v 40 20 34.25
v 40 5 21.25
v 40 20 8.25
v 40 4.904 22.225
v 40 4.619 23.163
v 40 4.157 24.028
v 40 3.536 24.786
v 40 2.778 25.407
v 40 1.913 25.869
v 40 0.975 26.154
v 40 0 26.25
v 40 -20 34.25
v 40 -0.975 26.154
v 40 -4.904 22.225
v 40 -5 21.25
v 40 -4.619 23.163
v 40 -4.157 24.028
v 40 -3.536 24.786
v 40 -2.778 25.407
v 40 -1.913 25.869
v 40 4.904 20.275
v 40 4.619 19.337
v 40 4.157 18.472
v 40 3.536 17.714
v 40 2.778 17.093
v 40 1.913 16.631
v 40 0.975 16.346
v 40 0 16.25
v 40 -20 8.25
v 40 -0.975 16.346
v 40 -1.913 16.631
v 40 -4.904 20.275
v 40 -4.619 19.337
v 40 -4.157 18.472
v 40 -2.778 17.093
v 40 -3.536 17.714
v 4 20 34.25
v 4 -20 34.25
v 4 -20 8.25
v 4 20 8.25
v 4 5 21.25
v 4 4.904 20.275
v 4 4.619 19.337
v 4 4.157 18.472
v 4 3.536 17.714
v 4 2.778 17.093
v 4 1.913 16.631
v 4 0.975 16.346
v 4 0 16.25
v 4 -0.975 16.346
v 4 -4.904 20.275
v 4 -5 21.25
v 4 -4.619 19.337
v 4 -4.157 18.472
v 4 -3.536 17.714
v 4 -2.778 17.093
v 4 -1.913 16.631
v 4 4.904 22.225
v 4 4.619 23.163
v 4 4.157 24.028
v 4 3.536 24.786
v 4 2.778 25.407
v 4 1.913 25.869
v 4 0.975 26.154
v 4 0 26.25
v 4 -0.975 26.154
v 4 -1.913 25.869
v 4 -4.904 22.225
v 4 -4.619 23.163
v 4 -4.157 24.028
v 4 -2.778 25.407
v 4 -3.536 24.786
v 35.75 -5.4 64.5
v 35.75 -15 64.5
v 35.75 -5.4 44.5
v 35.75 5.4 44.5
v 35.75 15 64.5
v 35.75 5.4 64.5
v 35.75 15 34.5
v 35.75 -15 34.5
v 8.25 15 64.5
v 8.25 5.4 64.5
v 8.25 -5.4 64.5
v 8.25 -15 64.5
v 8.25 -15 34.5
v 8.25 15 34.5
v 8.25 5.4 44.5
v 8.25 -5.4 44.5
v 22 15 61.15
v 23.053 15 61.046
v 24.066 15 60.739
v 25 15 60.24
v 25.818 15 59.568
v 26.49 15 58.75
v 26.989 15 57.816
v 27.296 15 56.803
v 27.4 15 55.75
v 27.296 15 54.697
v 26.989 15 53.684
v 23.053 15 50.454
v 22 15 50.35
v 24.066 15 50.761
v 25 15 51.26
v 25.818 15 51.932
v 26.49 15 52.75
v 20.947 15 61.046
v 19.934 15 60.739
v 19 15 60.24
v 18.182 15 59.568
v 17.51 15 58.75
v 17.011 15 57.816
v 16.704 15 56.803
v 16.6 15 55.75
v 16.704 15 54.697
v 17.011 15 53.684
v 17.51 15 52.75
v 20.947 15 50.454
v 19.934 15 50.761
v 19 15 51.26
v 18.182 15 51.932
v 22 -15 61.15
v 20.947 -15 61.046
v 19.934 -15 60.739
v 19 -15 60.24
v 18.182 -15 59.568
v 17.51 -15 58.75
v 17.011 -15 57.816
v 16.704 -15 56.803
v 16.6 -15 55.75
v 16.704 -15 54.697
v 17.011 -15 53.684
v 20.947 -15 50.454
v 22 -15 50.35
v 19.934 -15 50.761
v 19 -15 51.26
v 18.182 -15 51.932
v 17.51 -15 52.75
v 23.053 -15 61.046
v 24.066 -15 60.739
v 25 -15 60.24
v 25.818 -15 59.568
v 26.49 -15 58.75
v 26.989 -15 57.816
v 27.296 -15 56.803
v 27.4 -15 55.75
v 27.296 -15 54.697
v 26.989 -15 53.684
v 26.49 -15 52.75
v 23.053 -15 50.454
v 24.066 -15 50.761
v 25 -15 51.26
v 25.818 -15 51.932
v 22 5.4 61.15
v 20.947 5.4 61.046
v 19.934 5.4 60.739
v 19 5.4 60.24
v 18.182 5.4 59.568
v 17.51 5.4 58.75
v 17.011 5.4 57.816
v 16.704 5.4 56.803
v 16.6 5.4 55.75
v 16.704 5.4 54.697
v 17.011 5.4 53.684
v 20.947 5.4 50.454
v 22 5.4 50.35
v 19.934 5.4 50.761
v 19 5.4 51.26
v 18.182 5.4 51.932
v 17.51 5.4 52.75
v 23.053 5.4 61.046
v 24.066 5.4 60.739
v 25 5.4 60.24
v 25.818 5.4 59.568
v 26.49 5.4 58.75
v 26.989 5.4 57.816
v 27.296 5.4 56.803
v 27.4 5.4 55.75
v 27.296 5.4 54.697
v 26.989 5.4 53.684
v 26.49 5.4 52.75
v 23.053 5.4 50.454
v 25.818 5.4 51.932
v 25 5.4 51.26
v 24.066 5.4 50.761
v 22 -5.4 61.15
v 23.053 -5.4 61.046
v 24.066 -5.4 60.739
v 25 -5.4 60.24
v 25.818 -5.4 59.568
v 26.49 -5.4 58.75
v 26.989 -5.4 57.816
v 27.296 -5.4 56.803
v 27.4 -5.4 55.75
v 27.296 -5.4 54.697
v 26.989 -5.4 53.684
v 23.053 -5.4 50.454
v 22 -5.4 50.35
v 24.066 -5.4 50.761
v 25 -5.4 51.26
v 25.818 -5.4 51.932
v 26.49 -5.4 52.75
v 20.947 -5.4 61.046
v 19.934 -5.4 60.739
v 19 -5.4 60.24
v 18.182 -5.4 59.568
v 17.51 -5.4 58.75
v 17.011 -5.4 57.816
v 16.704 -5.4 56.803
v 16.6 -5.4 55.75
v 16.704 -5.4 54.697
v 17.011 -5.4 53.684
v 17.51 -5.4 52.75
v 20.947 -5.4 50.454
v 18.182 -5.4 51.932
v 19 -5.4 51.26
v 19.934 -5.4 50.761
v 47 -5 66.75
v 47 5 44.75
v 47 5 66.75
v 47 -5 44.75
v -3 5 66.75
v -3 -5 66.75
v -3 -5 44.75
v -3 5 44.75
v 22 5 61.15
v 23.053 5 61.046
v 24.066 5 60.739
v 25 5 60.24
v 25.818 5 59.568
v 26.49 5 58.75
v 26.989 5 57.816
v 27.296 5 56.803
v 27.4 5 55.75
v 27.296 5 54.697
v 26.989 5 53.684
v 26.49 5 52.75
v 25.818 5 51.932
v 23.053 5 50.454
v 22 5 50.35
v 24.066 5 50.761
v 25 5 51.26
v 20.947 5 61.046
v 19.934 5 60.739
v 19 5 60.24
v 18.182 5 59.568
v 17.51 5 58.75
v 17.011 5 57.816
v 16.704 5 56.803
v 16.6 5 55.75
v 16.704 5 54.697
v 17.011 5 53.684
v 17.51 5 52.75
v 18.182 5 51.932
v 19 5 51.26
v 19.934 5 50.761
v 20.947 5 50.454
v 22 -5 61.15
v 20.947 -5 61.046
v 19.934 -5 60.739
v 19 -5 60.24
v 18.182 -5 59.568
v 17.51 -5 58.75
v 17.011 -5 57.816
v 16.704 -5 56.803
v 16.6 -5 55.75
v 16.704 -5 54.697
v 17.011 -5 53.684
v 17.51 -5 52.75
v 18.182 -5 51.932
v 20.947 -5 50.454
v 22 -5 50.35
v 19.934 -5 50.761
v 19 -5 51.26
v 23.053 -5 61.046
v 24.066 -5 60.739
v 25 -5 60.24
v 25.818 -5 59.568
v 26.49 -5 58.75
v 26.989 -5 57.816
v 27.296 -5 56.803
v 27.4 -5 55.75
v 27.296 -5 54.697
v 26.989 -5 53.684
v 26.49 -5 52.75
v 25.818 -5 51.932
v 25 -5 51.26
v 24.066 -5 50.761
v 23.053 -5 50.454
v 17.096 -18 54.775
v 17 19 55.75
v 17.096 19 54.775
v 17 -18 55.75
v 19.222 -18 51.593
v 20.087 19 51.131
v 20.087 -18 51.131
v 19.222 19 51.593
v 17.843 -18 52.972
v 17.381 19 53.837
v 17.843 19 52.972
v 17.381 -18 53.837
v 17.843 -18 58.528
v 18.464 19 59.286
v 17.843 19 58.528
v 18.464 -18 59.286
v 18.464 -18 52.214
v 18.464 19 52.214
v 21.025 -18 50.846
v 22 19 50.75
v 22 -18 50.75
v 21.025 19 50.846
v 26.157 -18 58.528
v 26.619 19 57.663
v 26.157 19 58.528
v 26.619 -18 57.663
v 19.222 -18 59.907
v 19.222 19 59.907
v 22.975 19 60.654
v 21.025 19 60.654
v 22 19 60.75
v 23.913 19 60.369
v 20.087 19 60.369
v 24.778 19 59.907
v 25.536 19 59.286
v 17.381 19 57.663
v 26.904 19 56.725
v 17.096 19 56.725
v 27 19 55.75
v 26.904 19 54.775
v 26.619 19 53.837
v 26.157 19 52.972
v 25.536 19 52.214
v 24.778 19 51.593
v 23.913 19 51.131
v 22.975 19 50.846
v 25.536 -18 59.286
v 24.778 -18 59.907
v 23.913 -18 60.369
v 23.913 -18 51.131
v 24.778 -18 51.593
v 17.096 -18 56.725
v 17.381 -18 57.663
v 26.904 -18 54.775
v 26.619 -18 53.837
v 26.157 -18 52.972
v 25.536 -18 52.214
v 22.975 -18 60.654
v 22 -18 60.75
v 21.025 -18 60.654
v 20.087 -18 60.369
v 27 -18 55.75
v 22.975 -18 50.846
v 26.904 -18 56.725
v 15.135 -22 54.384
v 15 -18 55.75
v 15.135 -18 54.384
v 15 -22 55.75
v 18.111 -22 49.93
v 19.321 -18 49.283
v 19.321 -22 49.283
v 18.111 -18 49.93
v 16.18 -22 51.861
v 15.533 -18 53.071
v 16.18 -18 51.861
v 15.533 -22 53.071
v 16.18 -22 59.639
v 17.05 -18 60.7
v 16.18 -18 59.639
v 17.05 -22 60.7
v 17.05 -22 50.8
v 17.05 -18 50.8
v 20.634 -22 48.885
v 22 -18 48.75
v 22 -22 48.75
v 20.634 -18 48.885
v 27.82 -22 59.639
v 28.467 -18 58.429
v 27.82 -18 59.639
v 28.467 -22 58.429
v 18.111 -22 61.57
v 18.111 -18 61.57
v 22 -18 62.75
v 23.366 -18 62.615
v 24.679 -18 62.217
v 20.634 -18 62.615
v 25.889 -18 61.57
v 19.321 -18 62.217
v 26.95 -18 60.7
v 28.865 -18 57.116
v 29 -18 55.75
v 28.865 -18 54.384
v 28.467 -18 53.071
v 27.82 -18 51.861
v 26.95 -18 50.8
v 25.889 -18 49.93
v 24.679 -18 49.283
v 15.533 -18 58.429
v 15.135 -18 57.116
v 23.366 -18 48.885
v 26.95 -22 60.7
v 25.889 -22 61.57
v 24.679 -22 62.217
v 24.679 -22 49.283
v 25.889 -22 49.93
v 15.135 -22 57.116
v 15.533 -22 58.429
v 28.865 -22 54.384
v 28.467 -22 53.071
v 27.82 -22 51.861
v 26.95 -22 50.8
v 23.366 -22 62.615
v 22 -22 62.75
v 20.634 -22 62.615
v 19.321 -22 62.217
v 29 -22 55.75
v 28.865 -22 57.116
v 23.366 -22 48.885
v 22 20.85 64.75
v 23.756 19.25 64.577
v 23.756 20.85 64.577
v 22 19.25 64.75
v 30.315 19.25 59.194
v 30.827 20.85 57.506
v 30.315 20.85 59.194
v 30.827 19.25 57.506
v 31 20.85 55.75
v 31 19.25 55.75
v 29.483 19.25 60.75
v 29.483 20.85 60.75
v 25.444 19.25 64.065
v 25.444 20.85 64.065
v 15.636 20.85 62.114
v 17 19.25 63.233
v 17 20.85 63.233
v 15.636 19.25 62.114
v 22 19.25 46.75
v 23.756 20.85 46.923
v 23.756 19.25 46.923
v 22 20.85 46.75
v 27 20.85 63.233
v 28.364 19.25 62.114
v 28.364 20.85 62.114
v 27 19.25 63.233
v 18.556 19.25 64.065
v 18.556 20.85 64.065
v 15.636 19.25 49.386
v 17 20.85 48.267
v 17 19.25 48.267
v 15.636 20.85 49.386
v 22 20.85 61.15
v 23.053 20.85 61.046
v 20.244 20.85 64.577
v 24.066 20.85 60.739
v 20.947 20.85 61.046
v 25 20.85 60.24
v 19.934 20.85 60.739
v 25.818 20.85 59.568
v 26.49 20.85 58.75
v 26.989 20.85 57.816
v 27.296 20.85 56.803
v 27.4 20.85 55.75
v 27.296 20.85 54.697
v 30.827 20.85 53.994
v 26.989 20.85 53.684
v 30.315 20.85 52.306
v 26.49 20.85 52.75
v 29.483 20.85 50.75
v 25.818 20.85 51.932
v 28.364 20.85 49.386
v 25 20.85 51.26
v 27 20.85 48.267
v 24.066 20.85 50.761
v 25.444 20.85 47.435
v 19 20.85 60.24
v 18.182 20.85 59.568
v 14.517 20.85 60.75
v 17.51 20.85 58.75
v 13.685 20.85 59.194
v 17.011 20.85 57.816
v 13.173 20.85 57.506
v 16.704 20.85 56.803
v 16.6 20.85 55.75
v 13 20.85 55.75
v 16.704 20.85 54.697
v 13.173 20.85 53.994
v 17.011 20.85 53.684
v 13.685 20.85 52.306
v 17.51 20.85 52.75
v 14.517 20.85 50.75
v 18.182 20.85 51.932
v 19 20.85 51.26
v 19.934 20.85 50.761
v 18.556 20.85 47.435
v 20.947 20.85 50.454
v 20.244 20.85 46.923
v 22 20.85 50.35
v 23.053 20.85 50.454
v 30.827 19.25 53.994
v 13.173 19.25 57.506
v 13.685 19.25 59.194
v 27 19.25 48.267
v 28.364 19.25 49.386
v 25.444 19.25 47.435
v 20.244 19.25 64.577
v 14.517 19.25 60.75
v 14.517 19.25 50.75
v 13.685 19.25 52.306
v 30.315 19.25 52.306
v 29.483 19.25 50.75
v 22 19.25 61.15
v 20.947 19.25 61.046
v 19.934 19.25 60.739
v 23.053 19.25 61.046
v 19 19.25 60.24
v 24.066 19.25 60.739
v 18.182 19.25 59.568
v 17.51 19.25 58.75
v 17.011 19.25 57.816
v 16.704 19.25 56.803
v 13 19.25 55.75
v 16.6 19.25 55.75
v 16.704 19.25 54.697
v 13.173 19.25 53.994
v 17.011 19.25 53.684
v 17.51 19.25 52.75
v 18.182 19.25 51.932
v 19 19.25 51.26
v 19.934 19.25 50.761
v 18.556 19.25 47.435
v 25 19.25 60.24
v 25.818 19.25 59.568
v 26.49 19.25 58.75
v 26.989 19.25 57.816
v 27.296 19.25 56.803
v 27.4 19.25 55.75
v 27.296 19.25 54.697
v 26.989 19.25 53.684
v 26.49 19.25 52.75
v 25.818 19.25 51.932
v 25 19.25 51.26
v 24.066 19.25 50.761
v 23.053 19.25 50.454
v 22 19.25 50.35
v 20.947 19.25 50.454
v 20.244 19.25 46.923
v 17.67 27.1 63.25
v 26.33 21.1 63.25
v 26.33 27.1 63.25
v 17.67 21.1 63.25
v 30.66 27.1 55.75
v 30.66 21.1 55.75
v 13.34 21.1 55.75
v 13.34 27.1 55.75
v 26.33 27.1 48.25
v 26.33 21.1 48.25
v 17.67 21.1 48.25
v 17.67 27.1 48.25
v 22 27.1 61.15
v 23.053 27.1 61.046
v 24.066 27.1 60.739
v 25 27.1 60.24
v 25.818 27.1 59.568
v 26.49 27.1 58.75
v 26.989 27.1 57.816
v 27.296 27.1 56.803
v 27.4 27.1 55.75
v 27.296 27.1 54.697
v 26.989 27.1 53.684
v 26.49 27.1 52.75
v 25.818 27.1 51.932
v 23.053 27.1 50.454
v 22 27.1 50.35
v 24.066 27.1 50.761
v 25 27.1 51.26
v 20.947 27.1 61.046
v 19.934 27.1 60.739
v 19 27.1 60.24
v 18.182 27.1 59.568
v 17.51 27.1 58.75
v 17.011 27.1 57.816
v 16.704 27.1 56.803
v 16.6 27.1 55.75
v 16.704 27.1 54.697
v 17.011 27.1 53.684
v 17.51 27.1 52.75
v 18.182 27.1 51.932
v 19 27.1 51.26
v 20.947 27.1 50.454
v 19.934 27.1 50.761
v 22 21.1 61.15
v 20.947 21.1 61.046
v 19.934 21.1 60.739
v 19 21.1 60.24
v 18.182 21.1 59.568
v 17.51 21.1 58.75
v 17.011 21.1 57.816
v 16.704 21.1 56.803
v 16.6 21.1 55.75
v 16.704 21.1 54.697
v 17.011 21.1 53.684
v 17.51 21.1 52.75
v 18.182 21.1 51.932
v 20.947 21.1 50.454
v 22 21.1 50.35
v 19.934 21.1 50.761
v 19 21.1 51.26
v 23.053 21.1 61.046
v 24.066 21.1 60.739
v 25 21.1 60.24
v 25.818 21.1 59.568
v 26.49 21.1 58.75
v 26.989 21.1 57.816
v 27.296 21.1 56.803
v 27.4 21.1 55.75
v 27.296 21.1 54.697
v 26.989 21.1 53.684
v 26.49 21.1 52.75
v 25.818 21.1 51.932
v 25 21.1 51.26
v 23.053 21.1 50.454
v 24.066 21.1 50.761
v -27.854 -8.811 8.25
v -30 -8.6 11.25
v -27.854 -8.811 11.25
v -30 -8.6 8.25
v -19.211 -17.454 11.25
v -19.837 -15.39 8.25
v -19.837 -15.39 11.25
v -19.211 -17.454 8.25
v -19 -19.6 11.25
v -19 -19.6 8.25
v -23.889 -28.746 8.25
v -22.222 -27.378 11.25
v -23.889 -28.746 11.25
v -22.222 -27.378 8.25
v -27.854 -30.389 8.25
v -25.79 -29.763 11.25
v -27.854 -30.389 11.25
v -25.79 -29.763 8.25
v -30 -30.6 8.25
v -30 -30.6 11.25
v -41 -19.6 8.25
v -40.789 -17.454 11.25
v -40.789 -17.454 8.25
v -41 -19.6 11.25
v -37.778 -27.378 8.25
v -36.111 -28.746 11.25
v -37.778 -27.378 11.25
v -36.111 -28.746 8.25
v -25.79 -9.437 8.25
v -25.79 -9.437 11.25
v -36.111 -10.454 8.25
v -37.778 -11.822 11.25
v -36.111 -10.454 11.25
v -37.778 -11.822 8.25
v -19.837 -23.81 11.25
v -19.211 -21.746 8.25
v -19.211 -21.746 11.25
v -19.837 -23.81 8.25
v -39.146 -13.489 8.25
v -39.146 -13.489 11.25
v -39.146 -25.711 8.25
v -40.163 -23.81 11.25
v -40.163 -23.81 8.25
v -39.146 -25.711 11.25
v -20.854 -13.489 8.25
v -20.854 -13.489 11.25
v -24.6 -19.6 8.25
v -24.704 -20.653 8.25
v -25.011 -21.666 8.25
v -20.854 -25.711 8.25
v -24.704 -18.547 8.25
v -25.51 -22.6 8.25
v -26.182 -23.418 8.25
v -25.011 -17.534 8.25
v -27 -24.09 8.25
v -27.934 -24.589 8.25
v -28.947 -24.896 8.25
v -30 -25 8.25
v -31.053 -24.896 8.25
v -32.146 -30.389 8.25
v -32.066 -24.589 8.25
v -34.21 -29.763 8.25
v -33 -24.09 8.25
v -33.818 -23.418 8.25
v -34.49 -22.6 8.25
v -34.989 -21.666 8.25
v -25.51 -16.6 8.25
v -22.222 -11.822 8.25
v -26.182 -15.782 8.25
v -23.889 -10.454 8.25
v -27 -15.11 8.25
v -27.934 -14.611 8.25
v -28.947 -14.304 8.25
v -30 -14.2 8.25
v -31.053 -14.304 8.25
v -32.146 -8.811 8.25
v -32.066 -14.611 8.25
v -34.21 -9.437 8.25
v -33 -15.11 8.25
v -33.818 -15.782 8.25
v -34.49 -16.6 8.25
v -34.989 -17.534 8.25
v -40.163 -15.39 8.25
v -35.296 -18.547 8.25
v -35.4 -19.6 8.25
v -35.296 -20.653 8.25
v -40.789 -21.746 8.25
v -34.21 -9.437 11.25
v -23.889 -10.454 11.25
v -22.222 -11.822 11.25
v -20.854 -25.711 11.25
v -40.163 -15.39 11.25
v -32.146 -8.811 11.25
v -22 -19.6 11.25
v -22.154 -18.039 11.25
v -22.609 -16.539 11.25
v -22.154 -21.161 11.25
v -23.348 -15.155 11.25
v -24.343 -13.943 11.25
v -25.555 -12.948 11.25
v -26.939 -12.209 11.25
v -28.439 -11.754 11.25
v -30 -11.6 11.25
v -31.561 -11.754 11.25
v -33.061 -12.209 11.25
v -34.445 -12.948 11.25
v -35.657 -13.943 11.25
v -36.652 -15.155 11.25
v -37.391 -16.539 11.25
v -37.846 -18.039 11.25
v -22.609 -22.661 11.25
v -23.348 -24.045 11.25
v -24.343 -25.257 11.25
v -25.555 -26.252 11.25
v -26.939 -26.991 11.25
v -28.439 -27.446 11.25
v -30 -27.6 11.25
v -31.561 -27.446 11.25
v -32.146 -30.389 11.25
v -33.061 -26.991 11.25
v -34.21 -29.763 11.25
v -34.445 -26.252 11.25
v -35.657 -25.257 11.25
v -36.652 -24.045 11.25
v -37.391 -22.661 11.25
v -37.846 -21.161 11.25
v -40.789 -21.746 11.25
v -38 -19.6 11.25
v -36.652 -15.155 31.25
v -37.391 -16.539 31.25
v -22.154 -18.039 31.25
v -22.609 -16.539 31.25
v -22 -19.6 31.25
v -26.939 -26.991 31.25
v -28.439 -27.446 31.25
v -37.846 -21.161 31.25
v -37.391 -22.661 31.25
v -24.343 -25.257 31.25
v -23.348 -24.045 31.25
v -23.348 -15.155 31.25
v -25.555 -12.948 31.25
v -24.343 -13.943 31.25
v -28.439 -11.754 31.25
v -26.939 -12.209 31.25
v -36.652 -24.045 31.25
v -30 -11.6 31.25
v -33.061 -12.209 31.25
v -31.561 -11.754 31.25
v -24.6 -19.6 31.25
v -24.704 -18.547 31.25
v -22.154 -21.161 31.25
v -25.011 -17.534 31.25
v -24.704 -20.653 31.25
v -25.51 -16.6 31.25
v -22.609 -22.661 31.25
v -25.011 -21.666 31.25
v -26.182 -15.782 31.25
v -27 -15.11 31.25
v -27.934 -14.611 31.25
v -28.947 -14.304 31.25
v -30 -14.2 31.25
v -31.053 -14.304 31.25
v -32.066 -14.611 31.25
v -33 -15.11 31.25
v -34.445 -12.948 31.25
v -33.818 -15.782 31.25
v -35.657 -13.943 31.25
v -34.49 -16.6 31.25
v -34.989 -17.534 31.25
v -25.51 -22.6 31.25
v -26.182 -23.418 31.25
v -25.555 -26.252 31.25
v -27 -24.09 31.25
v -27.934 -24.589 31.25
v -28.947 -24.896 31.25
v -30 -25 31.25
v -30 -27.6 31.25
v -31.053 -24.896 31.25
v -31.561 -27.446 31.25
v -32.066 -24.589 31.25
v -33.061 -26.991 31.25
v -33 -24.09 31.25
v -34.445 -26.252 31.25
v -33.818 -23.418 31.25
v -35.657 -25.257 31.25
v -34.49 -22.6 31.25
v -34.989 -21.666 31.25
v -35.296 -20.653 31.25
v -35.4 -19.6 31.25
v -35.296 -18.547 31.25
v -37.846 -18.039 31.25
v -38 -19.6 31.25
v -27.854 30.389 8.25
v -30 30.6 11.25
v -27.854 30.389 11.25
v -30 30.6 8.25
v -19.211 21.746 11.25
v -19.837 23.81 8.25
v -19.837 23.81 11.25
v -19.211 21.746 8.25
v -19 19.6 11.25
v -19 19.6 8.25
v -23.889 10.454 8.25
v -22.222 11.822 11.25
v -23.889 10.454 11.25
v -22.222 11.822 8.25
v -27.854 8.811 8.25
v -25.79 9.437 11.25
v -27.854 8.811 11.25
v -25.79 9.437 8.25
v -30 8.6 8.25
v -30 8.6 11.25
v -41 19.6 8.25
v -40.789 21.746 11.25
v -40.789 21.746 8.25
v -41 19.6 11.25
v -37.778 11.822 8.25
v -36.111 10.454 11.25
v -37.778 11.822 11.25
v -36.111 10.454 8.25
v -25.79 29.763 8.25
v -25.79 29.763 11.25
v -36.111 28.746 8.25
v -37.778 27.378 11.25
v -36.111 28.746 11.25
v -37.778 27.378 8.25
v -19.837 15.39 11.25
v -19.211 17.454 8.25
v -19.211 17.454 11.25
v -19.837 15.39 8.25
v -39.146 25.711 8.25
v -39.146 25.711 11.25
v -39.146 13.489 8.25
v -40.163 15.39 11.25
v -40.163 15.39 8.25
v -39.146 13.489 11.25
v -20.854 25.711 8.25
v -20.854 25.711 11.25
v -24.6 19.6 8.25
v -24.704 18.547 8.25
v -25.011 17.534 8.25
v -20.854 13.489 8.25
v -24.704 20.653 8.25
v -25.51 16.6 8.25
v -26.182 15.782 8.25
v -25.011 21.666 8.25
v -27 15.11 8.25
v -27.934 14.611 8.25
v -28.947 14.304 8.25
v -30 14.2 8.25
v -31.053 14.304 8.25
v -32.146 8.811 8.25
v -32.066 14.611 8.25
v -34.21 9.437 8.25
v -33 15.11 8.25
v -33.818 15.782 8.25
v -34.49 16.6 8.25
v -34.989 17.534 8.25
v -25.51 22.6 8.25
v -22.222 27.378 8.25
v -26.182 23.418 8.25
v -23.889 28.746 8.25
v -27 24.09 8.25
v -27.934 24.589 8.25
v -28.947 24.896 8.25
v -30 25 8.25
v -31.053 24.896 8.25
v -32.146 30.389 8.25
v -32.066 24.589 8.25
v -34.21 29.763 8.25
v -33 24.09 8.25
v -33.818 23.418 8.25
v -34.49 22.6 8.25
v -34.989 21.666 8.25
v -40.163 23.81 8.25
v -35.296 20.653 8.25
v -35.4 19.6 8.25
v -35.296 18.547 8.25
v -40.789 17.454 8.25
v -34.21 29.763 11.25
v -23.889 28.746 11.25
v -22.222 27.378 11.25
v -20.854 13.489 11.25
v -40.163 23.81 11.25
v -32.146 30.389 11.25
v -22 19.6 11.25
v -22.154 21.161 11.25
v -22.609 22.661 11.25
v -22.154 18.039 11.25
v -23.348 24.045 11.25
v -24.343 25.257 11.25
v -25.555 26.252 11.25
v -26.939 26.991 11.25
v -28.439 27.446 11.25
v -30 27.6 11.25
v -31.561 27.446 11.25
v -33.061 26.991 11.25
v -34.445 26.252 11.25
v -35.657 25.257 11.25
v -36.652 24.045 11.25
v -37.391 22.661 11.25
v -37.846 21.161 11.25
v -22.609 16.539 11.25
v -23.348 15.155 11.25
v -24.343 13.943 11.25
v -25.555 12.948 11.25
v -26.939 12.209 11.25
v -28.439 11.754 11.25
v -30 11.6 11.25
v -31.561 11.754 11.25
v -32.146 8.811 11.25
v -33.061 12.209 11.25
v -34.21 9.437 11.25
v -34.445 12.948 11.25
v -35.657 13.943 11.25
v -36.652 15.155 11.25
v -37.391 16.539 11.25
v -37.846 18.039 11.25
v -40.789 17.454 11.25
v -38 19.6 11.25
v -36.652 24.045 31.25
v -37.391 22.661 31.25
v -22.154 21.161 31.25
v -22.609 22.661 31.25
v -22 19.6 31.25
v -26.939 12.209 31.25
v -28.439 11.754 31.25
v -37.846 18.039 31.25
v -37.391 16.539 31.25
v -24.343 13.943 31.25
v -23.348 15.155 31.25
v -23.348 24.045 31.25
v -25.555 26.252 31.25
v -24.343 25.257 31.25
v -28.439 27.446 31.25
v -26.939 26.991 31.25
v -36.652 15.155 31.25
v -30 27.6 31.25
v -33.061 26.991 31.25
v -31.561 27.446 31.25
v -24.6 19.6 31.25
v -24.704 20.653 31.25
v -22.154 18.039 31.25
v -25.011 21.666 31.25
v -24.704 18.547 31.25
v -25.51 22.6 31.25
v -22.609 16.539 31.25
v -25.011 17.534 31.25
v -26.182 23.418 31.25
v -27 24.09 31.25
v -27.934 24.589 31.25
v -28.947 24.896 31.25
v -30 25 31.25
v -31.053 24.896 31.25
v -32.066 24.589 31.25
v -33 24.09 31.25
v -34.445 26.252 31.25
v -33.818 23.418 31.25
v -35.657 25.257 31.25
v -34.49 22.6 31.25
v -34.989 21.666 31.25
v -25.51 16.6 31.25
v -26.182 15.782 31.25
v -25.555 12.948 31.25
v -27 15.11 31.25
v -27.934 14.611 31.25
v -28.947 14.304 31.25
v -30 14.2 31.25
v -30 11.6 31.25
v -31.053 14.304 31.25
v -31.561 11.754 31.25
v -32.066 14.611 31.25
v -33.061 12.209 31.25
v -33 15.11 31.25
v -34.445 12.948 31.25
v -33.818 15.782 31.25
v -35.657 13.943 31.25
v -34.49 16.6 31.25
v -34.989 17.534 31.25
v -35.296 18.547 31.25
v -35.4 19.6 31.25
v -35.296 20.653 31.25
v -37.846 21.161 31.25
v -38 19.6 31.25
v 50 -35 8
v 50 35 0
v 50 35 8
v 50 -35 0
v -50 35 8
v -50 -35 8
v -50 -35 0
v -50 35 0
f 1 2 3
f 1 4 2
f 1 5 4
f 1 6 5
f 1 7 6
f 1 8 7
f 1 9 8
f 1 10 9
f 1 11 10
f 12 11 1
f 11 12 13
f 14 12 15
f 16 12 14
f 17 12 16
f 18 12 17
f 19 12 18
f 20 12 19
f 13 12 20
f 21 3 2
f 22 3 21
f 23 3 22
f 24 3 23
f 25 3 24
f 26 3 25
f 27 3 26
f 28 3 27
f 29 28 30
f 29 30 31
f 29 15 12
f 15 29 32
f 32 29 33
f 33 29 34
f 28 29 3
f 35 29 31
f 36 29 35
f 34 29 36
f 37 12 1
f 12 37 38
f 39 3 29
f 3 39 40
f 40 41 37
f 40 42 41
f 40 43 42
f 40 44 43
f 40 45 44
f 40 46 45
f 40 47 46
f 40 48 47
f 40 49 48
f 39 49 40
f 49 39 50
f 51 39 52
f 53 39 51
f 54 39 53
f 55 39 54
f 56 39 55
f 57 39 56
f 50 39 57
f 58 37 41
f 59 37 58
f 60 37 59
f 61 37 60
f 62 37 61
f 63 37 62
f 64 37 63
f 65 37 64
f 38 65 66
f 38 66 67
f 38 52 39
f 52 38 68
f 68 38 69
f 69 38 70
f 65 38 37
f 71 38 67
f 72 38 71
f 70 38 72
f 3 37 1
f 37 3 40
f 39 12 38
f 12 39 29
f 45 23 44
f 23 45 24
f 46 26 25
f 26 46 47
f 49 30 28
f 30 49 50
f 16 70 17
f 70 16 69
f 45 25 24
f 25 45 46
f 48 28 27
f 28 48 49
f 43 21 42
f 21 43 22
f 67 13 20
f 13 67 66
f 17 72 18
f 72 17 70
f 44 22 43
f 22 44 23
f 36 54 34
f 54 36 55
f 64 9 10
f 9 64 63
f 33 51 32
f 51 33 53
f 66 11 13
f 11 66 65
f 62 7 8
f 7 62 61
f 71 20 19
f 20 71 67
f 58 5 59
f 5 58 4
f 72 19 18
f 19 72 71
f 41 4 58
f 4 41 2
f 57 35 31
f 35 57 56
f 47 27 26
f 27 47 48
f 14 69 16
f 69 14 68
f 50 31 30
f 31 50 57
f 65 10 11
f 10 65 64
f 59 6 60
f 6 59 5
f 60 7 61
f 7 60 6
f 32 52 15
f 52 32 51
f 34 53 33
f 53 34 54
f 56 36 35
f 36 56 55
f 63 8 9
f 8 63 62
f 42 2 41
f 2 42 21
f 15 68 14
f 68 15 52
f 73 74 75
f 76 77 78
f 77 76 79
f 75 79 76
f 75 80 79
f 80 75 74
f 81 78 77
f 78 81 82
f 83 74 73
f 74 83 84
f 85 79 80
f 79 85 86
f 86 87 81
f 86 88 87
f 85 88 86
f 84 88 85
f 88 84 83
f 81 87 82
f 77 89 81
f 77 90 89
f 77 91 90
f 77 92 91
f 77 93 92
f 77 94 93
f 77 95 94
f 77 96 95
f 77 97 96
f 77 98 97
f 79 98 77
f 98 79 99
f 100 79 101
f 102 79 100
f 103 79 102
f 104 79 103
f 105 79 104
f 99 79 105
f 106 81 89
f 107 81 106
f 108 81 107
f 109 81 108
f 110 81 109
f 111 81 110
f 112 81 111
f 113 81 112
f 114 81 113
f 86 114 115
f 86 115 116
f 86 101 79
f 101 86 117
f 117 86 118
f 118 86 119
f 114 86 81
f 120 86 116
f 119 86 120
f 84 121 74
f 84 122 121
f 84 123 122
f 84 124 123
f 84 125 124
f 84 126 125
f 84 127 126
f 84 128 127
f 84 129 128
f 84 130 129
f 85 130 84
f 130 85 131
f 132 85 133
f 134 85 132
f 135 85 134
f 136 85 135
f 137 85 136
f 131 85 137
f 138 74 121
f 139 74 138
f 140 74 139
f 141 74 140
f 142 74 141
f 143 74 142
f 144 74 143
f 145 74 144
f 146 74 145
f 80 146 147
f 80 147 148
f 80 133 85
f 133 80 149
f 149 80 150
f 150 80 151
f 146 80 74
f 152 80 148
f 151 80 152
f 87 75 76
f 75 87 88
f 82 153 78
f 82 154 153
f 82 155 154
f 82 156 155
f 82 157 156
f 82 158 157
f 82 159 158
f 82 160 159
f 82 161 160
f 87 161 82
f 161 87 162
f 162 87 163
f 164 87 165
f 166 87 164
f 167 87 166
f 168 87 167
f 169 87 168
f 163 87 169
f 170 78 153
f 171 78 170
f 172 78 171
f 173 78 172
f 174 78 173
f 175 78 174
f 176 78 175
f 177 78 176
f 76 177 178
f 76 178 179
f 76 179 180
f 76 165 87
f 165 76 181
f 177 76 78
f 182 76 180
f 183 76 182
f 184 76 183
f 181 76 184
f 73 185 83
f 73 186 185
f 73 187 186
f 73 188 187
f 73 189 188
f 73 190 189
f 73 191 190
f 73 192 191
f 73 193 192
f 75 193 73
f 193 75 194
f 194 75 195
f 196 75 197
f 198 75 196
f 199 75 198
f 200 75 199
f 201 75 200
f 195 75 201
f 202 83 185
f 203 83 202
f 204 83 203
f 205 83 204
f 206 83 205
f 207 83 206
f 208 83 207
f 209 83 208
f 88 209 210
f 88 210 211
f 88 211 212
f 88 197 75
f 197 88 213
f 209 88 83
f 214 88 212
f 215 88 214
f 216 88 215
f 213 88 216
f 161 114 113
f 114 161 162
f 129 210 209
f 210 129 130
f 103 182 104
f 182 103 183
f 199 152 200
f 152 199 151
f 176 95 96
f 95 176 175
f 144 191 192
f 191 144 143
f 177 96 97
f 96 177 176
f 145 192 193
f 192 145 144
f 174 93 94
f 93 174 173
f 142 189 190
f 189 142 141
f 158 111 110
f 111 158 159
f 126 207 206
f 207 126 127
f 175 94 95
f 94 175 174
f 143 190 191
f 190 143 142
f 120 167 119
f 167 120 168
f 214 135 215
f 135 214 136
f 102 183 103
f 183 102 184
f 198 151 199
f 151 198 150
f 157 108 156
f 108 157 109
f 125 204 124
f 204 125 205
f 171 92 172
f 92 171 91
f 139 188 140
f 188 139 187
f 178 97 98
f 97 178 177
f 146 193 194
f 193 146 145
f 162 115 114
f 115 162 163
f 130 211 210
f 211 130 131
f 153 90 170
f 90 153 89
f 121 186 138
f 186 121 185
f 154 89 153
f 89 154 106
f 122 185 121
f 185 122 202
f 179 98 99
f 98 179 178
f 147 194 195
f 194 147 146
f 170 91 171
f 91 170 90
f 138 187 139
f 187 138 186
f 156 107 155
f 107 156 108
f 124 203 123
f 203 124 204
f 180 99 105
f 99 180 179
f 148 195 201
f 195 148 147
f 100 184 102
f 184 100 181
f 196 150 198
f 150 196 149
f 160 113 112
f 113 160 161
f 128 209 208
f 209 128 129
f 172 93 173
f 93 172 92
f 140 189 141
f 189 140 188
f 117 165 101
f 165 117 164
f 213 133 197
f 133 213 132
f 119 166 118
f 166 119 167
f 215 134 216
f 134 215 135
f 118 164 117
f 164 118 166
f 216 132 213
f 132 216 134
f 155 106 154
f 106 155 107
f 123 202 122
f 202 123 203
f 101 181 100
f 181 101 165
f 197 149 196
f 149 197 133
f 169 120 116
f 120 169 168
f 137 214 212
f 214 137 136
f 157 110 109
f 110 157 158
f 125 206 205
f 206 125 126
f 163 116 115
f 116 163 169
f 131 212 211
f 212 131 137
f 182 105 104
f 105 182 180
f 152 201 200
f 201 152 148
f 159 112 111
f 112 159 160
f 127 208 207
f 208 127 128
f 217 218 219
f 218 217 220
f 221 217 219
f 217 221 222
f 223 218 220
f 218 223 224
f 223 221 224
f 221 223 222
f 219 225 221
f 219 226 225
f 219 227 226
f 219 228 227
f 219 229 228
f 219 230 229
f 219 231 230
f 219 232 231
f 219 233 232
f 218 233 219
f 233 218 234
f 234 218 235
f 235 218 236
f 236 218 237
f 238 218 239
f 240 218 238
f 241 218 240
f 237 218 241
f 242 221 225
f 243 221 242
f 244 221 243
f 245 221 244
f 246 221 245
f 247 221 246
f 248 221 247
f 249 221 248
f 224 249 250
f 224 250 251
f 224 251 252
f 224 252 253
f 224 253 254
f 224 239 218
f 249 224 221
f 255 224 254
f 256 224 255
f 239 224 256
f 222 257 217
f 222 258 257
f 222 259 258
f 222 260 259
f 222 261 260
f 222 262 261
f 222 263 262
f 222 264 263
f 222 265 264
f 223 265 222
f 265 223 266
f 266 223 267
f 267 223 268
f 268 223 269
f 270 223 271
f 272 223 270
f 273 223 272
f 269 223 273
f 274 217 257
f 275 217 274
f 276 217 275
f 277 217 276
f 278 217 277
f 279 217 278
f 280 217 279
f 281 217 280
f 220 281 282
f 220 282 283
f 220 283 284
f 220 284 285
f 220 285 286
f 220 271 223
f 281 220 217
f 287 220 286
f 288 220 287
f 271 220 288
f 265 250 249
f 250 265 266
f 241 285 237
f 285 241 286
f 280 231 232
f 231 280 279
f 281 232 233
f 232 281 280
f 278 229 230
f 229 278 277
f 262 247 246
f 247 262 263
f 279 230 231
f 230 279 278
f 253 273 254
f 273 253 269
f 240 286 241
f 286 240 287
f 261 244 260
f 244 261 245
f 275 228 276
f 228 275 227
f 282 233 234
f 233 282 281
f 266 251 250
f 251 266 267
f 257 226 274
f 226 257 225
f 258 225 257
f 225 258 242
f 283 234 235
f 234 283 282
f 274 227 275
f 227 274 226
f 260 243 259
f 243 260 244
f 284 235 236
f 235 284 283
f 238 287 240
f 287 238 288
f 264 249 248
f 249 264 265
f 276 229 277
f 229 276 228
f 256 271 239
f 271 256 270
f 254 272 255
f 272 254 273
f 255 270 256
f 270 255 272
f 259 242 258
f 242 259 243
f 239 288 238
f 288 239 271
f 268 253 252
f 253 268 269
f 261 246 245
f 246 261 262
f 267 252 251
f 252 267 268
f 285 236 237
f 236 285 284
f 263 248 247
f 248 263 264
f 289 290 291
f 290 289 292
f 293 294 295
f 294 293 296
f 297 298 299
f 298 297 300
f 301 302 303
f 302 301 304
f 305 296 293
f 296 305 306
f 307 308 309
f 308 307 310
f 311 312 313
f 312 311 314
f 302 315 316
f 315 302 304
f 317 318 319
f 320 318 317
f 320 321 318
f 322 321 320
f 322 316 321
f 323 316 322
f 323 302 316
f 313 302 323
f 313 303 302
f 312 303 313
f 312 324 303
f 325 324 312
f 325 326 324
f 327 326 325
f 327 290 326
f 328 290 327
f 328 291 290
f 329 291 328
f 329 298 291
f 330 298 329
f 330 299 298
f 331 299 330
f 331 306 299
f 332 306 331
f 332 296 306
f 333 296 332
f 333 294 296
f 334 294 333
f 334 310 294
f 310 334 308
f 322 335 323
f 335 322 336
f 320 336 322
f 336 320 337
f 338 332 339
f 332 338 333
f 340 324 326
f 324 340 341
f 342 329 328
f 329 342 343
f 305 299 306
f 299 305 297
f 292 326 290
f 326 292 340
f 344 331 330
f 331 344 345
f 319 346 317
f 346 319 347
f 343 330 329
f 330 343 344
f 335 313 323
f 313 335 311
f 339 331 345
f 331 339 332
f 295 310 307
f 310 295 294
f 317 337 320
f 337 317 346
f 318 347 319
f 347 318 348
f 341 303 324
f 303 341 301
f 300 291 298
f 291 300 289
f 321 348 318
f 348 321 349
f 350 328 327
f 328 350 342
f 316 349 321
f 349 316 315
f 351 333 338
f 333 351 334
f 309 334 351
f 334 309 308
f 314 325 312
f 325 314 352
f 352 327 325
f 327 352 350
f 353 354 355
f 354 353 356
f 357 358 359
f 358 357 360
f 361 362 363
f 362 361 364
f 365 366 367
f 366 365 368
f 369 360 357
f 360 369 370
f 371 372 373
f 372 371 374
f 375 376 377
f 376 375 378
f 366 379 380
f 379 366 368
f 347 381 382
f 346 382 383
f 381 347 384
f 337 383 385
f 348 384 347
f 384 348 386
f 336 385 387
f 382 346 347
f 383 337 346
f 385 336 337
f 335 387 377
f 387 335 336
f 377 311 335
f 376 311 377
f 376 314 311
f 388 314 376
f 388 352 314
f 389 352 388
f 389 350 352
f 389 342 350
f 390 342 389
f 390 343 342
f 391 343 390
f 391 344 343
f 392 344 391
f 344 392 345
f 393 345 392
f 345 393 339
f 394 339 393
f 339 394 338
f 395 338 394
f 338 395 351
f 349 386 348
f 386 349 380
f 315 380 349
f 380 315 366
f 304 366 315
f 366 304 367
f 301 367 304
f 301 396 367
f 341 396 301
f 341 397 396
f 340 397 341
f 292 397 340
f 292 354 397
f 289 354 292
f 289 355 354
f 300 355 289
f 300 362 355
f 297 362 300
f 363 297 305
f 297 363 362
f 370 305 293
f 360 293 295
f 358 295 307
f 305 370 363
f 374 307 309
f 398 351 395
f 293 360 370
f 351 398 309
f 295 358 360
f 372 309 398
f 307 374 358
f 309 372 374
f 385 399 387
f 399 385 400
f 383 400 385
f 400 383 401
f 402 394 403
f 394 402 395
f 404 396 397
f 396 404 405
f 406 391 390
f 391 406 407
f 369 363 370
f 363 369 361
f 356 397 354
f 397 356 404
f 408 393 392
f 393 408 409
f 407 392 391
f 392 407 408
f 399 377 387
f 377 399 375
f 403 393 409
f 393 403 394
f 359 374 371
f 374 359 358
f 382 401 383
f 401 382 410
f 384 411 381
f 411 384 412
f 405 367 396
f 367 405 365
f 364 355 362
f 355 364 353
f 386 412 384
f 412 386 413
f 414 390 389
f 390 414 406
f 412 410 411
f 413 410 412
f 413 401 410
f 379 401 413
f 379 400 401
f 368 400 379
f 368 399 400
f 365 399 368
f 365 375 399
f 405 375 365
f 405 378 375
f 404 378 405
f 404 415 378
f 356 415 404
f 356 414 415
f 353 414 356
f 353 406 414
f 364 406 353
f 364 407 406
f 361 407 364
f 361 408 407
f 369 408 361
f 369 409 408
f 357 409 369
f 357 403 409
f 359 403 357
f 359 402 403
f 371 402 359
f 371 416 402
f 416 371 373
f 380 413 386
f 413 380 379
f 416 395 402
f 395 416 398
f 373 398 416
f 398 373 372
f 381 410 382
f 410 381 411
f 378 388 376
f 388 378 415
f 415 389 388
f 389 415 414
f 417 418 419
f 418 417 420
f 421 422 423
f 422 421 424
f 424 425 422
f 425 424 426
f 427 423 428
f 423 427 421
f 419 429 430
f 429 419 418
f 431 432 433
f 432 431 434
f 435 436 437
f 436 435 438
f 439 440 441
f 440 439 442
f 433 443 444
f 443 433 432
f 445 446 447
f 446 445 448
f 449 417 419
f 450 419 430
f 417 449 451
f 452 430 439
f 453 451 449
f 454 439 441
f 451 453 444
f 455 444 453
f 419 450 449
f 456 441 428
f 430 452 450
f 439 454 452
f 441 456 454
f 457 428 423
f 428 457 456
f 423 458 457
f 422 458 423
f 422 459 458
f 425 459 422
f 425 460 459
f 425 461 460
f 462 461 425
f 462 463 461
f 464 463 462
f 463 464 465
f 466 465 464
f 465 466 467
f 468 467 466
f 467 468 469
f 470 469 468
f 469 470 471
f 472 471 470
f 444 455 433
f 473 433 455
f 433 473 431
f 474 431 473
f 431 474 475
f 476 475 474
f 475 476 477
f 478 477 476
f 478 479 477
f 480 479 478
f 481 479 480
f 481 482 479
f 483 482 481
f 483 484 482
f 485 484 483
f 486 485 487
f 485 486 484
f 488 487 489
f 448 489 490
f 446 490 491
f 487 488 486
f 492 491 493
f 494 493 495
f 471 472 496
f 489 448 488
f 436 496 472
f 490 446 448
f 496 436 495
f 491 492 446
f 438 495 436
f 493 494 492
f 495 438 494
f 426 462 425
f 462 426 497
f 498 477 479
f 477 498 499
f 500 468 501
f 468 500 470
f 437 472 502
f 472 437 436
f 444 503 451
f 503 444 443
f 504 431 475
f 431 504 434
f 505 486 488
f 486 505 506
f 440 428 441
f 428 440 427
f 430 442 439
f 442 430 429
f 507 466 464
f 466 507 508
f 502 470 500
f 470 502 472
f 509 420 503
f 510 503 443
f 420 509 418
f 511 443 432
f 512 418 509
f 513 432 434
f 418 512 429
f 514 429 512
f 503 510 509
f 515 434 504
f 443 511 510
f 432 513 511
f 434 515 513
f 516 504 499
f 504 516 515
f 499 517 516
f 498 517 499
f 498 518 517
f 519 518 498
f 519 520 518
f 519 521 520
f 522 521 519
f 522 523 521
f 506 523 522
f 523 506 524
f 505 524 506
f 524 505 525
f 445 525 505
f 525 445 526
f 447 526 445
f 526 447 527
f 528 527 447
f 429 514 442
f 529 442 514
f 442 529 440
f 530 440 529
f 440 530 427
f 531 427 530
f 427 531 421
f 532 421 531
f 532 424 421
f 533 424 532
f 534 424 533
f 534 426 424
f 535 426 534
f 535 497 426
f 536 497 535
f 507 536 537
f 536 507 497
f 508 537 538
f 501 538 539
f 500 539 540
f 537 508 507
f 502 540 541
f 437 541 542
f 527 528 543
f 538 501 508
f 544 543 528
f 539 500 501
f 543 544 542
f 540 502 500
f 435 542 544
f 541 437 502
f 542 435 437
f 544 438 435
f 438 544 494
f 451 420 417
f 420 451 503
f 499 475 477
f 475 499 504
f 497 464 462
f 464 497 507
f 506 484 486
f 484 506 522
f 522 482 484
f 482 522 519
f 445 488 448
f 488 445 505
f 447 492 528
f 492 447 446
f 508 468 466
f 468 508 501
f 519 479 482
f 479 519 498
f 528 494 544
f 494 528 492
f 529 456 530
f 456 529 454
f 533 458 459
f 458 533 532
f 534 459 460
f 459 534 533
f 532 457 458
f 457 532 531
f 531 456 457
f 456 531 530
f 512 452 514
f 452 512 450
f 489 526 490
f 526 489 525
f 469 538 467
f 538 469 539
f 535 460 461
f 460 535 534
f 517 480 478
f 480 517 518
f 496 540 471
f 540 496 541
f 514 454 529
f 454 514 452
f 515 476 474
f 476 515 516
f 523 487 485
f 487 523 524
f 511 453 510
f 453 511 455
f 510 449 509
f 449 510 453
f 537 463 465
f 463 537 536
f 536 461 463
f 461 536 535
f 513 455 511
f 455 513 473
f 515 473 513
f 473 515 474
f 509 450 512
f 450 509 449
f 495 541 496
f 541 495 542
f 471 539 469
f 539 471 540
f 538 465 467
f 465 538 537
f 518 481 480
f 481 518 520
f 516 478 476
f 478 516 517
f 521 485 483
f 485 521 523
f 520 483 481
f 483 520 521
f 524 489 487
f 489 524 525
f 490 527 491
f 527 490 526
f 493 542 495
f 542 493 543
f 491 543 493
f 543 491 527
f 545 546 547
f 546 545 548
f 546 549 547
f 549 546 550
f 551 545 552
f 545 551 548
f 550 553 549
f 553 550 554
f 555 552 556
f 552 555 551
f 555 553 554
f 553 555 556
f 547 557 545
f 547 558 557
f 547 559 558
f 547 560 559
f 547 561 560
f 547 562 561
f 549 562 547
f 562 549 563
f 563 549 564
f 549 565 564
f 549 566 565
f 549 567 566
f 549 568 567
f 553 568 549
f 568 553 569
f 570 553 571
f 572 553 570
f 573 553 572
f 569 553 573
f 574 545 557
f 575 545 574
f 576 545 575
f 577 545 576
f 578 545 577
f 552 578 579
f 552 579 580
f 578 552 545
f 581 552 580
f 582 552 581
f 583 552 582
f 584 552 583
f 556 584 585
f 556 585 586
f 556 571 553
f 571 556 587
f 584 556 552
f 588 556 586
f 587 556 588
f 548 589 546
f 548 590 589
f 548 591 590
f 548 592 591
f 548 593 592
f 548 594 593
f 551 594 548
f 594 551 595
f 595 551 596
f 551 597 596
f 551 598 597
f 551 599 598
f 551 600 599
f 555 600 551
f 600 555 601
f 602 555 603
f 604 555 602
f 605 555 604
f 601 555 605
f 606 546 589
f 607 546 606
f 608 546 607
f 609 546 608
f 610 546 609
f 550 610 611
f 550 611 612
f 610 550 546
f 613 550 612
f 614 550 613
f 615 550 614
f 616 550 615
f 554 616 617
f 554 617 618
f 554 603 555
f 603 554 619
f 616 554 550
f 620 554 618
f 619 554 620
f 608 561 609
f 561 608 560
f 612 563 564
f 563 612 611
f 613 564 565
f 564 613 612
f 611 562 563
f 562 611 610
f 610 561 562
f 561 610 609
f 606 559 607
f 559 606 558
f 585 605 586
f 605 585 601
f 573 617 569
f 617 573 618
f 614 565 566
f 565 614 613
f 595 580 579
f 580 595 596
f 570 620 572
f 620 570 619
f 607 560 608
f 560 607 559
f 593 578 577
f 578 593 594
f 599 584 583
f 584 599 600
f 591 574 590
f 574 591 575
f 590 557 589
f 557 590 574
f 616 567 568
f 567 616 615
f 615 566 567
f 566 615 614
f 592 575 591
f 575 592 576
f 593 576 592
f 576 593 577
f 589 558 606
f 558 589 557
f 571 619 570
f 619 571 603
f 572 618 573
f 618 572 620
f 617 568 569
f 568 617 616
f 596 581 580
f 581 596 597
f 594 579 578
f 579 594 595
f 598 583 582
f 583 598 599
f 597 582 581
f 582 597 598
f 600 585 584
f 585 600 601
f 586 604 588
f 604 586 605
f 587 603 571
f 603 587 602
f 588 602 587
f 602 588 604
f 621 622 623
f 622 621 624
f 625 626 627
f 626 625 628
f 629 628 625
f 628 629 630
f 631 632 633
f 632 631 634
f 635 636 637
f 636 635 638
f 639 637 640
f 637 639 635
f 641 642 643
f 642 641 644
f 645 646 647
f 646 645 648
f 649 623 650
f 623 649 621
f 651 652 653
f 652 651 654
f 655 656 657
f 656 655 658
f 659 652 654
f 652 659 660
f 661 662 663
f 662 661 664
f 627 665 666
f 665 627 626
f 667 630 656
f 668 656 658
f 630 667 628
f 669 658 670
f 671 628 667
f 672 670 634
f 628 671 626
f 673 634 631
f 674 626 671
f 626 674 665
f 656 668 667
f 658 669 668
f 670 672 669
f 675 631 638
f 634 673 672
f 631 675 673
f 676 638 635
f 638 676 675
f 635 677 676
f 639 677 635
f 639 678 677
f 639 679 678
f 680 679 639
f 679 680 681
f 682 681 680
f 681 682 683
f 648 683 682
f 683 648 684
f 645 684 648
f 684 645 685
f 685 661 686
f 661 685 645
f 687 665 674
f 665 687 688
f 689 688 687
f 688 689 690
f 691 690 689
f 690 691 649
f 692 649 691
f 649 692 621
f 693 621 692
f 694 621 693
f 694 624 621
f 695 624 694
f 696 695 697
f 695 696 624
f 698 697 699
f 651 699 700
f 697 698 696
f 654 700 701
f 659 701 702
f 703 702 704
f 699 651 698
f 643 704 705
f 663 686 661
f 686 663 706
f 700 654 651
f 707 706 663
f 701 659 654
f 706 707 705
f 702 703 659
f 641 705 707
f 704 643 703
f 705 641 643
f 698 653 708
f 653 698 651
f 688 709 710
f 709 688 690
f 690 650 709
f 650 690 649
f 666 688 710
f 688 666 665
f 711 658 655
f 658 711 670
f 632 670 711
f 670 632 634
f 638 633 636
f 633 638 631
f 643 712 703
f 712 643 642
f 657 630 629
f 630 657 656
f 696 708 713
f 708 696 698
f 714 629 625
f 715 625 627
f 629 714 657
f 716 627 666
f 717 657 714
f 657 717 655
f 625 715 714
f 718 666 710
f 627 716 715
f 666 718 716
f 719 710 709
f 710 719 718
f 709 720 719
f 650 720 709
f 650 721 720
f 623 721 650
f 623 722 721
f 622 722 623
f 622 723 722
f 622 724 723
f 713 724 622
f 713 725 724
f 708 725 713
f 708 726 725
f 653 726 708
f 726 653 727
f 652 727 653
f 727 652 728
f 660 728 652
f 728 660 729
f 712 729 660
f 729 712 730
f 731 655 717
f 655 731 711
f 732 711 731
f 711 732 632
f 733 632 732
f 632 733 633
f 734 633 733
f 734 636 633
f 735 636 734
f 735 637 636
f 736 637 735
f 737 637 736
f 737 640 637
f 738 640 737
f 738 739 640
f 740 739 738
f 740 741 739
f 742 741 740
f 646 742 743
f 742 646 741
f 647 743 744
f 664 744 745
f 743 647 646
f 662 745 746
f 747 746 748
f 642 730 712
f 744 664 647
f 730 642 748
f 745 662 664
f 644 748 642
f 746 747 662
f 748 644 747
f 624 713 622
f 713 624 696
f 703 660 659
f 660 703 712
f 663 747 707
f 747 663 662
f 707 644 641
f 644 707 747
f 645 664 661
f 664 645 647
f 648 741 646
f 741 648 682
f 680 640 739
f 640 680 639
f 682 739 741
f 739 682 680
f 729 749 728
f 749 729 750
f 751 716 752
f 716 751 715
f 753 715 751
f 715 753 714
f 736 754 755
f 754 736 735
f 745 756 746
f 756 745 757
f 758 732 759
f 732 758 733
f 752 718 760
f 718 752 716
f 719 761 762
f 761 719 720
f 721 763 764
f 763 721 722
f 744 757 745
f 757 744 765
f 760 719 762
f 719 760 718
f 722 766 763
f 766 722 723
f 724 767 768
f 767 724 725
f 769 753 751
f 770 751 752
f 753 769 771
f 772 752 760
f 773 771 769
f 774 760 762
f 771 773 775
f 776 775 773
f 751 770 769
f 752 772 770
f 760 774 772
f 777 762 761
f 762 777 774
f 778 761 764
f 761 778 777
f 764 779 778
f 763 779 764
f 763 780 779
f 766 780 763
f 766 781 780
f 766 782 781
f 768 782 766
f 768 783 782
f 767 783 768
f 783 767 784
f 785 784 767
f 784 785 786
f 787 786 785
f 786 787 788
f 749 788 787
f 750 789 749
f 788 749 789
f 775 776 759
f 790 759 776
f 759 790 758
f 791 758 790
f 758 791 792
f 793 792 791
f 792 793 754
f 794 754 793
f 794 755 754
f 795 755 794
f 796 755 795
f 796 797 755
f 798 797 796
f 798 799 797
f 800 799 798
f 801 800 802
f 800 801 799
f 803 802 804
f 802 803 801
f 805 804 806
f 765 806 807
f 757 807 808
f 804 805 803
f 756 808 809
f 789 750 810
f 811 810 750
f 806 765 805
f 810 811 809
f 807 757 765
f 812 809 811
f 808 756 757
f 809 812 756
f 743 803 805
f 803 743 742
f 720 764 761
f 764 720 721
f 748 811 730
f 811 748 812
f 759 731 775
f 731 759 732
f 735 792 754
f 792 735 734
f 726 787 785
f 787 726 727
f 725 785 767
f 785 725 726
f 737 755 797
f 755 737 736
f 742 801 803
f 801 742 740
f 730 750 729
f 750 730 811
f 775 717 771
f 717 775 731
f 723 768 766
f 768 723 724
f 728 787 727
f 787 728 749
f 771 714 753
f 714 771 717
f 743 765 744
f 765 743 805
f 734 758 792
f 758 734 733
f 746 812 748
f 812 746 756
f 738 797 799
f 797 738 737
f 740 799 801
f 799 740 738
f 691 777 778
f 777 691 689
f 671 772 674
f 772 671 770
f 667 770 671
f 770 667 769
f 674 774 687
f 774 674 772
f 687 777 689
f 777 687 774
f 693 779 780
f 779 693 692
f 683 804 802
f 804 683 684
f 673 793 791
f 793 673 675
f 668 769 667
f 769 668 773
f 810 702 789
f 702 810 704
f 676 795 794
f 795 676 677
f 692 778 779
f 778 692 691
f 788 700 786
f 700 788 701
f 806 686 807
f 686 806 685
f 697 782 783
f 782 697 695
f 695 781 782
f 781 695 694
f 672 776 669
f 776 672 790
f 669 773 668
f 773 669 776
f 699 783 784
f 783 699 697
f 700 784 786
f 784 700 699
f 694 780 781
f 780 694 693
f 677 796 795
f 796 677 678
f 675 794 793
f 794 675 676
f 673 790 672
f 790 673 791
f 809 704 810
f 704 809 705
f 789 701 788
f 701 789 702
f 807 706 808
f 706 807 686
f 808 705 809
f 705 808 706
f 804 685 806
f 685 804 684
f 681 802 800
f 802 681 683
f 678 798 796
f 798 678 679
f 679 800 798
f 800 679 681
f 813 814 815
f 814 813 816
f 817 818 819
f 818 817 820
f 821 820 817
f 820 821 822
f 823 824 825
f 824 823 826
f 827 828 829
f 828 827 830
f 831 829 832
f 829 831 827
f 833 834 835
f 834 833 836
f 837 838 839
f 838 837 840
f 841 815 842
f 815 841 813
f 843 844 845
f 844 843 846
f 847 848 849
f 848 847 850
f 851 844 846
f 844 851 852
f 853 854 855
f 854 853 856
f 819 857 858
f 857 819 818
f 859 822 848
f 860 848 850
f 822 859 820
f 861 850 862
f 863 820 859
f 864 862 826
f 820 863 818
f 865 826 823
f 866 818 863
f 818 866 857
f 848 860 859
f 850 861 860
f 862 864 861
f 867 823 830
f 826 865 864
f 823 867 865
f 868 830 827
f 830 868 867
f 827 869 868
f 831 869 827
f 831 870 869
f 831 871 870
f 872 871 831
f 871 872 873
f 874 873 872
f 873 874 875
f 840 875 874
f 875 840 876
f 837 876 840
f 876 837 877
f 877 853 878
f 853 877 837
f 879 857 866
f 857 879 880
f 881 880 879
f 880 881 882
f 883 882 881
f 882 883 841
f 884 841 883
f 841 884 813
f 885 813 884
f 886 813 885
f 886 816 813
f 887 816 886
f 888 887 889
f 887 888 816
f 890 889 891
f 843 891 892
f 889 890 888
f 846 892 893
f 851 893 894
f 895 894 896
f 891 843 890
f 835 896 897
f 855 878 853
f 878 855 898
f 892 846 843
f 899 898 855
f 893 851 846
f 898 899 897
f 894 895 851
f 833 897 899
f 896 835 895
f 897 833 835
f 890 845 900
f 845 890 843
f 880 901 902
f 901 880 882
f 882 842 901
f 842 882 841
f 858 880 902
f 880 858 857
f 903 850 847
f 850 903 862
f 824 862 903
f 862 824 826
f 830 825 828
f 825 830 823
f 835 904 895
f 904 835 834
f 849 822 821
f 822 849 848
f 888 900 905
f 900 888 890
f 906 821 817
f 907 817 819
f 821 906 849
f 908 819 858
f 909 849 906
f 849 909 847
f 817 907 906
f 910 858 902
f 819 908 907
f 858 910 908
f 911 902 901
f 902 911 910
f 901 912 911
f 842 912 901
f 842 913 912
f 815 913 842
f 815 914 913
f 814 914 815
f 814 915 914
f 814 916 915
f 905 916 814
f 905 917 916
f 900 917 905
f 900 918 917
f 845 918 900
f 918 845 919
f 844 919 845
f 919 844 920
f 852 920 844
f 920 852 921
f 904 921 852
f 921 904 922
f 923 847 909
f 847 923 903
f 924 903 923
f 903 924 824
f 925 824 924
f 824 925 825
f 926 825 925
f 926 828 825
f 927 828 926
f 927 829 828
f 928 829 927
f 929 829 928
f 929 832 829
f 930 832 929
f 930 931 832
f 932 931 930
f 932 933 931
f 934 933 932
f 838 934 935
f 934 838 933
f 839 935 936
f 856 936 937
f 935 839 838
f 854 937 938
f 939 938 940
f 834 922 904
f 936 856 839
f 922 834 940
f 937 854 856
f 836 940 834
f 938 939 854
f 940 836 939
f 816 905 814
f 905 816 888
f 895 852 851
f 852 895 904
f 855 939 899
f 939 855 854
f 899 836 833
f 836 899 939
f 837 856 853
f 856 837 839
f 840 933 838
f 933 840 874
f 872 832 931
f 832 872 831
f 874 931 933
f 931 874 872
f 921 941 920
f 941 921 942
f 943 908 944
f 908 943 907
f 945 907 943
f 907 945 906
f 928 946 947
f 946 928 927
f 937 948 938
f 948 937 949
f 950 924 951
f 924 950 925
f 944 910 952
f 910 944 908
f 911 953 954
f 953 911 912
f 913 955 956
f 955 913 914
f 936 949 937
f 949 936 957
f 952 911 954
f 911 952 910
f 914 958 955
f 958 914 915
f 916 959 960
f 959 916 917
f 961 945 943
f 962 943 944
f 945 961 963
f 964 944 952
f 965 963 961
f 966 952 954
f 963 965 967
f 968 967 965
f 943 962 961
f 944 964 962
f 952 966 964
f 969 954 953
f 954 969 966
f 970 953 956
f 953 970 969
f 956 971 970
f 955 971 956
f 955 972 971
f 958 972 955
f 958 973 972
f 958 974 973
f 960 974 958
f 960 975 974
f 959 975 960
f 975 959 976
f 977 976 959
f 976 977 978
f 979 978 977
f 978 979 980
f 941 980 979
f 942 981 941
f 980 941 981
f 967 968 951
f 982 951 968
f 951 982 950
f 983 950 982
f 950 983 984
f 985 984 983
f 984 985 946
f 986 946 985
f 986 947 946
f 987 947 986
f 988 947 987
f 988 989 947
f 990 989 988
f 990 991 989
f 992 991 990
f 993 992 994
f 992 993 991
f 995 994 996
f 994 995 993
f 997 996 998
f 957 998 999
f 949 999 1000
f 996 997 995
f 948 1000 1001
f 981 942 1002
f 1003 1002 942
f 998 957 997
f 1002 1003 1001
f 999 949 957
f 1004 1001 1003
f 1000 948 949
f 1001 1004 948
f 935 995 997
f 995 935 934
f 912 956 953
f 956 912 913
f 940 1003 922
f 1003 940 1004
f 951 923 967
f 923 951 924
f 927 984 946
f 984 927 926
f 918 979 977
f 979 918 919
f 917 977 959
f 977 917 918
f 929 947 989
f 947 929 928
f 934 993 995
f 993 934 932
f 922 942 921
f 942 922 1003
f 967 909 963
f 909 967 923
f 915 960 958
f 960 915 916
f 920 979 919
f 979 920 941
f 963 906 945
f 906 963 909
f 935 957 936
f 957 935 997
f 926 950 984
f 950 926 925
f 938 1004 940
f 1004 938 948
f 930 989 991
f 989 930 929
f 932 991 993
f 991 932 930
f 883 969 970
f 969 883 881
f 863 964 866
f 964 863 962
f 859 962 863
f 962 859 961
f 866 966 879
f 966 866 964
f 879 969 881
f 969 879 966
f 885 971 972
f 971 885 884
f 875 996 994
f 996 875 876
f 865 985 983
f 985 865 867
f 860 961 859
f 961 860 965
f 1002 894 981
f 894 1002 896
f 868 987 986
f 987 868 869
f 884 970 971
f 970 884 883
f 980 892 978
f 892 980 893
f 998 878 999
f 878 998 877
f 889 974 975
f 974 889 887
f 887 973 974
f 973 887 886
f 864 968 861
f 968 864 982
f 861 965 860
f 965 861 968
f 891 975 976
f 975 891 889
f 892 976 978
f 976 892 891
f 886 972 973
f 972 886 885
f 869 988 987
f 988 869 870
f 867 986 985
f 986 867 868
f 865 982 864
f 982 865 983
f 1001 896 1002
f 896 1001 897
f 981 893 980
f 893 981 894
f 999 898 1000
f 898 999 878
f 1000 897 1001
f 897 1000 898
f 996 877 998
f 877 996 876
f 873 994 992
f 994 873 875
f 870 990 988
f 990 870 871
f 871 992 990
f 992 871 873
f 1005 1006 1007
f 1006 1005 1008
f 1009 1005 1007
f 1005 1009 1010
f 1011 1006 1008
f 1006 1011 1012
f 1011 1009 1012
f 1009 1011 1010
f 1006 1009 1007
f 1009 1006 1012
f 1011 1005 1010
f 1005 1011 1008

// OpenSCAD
$fn = 32;

// ------------------------------------------------------------------------
// Indexing jig: plate 100 x 70 mm, pin d10
// Every part is its own module, assembly() places every instance.
// ------------------------------------------------------------------------

// --- part 1 ---
module jig_plate() {
  difference() {
    translate([-50, -35, 0]) cube([100, 70, 8]);
  }
}

// --- part 2 ---
module locator_block() {
  difference() {
    translate([-18, -20, 0]) cube([36, 40, 26]);
    translate([0, 0, 13]) rotate([0, 90, 0]) cylinder(h = 38, d = 10, center = true);
  }
}

// --- part 3 ---
module index_fork() {
  difference() {
    translate([-13.75, -15, 0]) cube([27.5, 30, 30]);
    translate([-14.75, -5.4, 10]) cube([29.5, 10.8, 21]);
    translate([0, 0, 21.25]) rotate([90, 0, 0]) cylinder(h = 32, d = 10.8, center = true);
  }
}

// --- part 4 ---
module index_arm() {
  difference() {
    translate([-25, -5, 0]) cube([50, 10, 22]);
    translate([0, 0, 11]) rotate([90, 0, 0]) cylinder(h = 12, d = 10.8, center = true);
  }
}

// --- part 5 ---
module index_pin() {
  rotate([0, 90, 0]) cylinder(h = 38, d = 10, center = true);
  translate([-22, 0, 0]) rotate([0, 90, 0]) cylinder(h = 4, d = 14);
}

// --- part 6 ---
module pin_washer() {
  difference() {
      translate([0, 0, 0]) cylinder(h = 1.6, d = 18);
      translate([0, 0, -1]) cylinder(h = 3.6, d = 10.8);
    }
}

// --- part 7 ---
module lock_nut() {
  difference() {
    linear_extrude(height = 6) polygon(points = [[8.66, 0], [4.33, 7.5], [-4.33, 7.5], [-8.66, 0], [-4.33, -7.5], [4.33, -7.5]]);
    translate([0, 0, -1]) cylinder(h = 8, d = 10.8);
  }
}

// --- part 8 ---
module guide_bush_a() {
  difference() {
    union() {
      cylinder(h = 3, d = 22);
      translate([0, 0, 3]) cylinder(h = 20, d = 16);
    }
    translate([0, 0, -1]) cylinder(h = 25, d = 10.8);
  }
}

// --- part 9 ---
module guide_bush_b() {
  difference() {
    union() {
      cylinder(h = 3, d = 22);
      translate([0, 0, 3]) cylinder(h = 20, d = 16);
    }
    translate([0, 0, -1]) cylinder(h = 25, d = 10.8);
  }
}

// --- assembly ---
module assembly() {
  color([0.80, 0.24, 0.20]) translate([0, 0, 0]) rotate([0, 0, 0]) jig_plate();
  color([0.20, 0.45, 0.75]) translate([22, 0, 8.25]) rotate([0, 0, 0]) locator_block();
  color([0.25, 0.62, 0.32]) translate([22, 0, 34.5]) rotate([0, 0, 0]) index_fork();
  color([0.92, 0.70, 0.18]) translate([22, 0, 44.75]) rotate([0, 0, 0]) index_arm();
  color([0.58, 0.35, 0.70]) translate([22, 0, 55.75]) rotate([0, 0, 90]) index_pin();
  color([0.16, 0.66, 0.66]) translate([22, 20.85, 55.75]) rotate([90, 0, 0]) pin_washer();
  color([0.85, 0.48, 0.18]) translate([22, 27.1, 55.75]) rotate([90, 0, 0]) lock_nut();
  color([0.55, 0.60, 0.65]) translate([-30, -19.6, 8.25]) rotate([0, 0, 0]) guide_bush_a();
  color([0.75, 0.30, 0.55]) translate([-30, 19.6, 8.25]) rotate([0, 0, 0]) guide_bush_b();
}

assembly();
